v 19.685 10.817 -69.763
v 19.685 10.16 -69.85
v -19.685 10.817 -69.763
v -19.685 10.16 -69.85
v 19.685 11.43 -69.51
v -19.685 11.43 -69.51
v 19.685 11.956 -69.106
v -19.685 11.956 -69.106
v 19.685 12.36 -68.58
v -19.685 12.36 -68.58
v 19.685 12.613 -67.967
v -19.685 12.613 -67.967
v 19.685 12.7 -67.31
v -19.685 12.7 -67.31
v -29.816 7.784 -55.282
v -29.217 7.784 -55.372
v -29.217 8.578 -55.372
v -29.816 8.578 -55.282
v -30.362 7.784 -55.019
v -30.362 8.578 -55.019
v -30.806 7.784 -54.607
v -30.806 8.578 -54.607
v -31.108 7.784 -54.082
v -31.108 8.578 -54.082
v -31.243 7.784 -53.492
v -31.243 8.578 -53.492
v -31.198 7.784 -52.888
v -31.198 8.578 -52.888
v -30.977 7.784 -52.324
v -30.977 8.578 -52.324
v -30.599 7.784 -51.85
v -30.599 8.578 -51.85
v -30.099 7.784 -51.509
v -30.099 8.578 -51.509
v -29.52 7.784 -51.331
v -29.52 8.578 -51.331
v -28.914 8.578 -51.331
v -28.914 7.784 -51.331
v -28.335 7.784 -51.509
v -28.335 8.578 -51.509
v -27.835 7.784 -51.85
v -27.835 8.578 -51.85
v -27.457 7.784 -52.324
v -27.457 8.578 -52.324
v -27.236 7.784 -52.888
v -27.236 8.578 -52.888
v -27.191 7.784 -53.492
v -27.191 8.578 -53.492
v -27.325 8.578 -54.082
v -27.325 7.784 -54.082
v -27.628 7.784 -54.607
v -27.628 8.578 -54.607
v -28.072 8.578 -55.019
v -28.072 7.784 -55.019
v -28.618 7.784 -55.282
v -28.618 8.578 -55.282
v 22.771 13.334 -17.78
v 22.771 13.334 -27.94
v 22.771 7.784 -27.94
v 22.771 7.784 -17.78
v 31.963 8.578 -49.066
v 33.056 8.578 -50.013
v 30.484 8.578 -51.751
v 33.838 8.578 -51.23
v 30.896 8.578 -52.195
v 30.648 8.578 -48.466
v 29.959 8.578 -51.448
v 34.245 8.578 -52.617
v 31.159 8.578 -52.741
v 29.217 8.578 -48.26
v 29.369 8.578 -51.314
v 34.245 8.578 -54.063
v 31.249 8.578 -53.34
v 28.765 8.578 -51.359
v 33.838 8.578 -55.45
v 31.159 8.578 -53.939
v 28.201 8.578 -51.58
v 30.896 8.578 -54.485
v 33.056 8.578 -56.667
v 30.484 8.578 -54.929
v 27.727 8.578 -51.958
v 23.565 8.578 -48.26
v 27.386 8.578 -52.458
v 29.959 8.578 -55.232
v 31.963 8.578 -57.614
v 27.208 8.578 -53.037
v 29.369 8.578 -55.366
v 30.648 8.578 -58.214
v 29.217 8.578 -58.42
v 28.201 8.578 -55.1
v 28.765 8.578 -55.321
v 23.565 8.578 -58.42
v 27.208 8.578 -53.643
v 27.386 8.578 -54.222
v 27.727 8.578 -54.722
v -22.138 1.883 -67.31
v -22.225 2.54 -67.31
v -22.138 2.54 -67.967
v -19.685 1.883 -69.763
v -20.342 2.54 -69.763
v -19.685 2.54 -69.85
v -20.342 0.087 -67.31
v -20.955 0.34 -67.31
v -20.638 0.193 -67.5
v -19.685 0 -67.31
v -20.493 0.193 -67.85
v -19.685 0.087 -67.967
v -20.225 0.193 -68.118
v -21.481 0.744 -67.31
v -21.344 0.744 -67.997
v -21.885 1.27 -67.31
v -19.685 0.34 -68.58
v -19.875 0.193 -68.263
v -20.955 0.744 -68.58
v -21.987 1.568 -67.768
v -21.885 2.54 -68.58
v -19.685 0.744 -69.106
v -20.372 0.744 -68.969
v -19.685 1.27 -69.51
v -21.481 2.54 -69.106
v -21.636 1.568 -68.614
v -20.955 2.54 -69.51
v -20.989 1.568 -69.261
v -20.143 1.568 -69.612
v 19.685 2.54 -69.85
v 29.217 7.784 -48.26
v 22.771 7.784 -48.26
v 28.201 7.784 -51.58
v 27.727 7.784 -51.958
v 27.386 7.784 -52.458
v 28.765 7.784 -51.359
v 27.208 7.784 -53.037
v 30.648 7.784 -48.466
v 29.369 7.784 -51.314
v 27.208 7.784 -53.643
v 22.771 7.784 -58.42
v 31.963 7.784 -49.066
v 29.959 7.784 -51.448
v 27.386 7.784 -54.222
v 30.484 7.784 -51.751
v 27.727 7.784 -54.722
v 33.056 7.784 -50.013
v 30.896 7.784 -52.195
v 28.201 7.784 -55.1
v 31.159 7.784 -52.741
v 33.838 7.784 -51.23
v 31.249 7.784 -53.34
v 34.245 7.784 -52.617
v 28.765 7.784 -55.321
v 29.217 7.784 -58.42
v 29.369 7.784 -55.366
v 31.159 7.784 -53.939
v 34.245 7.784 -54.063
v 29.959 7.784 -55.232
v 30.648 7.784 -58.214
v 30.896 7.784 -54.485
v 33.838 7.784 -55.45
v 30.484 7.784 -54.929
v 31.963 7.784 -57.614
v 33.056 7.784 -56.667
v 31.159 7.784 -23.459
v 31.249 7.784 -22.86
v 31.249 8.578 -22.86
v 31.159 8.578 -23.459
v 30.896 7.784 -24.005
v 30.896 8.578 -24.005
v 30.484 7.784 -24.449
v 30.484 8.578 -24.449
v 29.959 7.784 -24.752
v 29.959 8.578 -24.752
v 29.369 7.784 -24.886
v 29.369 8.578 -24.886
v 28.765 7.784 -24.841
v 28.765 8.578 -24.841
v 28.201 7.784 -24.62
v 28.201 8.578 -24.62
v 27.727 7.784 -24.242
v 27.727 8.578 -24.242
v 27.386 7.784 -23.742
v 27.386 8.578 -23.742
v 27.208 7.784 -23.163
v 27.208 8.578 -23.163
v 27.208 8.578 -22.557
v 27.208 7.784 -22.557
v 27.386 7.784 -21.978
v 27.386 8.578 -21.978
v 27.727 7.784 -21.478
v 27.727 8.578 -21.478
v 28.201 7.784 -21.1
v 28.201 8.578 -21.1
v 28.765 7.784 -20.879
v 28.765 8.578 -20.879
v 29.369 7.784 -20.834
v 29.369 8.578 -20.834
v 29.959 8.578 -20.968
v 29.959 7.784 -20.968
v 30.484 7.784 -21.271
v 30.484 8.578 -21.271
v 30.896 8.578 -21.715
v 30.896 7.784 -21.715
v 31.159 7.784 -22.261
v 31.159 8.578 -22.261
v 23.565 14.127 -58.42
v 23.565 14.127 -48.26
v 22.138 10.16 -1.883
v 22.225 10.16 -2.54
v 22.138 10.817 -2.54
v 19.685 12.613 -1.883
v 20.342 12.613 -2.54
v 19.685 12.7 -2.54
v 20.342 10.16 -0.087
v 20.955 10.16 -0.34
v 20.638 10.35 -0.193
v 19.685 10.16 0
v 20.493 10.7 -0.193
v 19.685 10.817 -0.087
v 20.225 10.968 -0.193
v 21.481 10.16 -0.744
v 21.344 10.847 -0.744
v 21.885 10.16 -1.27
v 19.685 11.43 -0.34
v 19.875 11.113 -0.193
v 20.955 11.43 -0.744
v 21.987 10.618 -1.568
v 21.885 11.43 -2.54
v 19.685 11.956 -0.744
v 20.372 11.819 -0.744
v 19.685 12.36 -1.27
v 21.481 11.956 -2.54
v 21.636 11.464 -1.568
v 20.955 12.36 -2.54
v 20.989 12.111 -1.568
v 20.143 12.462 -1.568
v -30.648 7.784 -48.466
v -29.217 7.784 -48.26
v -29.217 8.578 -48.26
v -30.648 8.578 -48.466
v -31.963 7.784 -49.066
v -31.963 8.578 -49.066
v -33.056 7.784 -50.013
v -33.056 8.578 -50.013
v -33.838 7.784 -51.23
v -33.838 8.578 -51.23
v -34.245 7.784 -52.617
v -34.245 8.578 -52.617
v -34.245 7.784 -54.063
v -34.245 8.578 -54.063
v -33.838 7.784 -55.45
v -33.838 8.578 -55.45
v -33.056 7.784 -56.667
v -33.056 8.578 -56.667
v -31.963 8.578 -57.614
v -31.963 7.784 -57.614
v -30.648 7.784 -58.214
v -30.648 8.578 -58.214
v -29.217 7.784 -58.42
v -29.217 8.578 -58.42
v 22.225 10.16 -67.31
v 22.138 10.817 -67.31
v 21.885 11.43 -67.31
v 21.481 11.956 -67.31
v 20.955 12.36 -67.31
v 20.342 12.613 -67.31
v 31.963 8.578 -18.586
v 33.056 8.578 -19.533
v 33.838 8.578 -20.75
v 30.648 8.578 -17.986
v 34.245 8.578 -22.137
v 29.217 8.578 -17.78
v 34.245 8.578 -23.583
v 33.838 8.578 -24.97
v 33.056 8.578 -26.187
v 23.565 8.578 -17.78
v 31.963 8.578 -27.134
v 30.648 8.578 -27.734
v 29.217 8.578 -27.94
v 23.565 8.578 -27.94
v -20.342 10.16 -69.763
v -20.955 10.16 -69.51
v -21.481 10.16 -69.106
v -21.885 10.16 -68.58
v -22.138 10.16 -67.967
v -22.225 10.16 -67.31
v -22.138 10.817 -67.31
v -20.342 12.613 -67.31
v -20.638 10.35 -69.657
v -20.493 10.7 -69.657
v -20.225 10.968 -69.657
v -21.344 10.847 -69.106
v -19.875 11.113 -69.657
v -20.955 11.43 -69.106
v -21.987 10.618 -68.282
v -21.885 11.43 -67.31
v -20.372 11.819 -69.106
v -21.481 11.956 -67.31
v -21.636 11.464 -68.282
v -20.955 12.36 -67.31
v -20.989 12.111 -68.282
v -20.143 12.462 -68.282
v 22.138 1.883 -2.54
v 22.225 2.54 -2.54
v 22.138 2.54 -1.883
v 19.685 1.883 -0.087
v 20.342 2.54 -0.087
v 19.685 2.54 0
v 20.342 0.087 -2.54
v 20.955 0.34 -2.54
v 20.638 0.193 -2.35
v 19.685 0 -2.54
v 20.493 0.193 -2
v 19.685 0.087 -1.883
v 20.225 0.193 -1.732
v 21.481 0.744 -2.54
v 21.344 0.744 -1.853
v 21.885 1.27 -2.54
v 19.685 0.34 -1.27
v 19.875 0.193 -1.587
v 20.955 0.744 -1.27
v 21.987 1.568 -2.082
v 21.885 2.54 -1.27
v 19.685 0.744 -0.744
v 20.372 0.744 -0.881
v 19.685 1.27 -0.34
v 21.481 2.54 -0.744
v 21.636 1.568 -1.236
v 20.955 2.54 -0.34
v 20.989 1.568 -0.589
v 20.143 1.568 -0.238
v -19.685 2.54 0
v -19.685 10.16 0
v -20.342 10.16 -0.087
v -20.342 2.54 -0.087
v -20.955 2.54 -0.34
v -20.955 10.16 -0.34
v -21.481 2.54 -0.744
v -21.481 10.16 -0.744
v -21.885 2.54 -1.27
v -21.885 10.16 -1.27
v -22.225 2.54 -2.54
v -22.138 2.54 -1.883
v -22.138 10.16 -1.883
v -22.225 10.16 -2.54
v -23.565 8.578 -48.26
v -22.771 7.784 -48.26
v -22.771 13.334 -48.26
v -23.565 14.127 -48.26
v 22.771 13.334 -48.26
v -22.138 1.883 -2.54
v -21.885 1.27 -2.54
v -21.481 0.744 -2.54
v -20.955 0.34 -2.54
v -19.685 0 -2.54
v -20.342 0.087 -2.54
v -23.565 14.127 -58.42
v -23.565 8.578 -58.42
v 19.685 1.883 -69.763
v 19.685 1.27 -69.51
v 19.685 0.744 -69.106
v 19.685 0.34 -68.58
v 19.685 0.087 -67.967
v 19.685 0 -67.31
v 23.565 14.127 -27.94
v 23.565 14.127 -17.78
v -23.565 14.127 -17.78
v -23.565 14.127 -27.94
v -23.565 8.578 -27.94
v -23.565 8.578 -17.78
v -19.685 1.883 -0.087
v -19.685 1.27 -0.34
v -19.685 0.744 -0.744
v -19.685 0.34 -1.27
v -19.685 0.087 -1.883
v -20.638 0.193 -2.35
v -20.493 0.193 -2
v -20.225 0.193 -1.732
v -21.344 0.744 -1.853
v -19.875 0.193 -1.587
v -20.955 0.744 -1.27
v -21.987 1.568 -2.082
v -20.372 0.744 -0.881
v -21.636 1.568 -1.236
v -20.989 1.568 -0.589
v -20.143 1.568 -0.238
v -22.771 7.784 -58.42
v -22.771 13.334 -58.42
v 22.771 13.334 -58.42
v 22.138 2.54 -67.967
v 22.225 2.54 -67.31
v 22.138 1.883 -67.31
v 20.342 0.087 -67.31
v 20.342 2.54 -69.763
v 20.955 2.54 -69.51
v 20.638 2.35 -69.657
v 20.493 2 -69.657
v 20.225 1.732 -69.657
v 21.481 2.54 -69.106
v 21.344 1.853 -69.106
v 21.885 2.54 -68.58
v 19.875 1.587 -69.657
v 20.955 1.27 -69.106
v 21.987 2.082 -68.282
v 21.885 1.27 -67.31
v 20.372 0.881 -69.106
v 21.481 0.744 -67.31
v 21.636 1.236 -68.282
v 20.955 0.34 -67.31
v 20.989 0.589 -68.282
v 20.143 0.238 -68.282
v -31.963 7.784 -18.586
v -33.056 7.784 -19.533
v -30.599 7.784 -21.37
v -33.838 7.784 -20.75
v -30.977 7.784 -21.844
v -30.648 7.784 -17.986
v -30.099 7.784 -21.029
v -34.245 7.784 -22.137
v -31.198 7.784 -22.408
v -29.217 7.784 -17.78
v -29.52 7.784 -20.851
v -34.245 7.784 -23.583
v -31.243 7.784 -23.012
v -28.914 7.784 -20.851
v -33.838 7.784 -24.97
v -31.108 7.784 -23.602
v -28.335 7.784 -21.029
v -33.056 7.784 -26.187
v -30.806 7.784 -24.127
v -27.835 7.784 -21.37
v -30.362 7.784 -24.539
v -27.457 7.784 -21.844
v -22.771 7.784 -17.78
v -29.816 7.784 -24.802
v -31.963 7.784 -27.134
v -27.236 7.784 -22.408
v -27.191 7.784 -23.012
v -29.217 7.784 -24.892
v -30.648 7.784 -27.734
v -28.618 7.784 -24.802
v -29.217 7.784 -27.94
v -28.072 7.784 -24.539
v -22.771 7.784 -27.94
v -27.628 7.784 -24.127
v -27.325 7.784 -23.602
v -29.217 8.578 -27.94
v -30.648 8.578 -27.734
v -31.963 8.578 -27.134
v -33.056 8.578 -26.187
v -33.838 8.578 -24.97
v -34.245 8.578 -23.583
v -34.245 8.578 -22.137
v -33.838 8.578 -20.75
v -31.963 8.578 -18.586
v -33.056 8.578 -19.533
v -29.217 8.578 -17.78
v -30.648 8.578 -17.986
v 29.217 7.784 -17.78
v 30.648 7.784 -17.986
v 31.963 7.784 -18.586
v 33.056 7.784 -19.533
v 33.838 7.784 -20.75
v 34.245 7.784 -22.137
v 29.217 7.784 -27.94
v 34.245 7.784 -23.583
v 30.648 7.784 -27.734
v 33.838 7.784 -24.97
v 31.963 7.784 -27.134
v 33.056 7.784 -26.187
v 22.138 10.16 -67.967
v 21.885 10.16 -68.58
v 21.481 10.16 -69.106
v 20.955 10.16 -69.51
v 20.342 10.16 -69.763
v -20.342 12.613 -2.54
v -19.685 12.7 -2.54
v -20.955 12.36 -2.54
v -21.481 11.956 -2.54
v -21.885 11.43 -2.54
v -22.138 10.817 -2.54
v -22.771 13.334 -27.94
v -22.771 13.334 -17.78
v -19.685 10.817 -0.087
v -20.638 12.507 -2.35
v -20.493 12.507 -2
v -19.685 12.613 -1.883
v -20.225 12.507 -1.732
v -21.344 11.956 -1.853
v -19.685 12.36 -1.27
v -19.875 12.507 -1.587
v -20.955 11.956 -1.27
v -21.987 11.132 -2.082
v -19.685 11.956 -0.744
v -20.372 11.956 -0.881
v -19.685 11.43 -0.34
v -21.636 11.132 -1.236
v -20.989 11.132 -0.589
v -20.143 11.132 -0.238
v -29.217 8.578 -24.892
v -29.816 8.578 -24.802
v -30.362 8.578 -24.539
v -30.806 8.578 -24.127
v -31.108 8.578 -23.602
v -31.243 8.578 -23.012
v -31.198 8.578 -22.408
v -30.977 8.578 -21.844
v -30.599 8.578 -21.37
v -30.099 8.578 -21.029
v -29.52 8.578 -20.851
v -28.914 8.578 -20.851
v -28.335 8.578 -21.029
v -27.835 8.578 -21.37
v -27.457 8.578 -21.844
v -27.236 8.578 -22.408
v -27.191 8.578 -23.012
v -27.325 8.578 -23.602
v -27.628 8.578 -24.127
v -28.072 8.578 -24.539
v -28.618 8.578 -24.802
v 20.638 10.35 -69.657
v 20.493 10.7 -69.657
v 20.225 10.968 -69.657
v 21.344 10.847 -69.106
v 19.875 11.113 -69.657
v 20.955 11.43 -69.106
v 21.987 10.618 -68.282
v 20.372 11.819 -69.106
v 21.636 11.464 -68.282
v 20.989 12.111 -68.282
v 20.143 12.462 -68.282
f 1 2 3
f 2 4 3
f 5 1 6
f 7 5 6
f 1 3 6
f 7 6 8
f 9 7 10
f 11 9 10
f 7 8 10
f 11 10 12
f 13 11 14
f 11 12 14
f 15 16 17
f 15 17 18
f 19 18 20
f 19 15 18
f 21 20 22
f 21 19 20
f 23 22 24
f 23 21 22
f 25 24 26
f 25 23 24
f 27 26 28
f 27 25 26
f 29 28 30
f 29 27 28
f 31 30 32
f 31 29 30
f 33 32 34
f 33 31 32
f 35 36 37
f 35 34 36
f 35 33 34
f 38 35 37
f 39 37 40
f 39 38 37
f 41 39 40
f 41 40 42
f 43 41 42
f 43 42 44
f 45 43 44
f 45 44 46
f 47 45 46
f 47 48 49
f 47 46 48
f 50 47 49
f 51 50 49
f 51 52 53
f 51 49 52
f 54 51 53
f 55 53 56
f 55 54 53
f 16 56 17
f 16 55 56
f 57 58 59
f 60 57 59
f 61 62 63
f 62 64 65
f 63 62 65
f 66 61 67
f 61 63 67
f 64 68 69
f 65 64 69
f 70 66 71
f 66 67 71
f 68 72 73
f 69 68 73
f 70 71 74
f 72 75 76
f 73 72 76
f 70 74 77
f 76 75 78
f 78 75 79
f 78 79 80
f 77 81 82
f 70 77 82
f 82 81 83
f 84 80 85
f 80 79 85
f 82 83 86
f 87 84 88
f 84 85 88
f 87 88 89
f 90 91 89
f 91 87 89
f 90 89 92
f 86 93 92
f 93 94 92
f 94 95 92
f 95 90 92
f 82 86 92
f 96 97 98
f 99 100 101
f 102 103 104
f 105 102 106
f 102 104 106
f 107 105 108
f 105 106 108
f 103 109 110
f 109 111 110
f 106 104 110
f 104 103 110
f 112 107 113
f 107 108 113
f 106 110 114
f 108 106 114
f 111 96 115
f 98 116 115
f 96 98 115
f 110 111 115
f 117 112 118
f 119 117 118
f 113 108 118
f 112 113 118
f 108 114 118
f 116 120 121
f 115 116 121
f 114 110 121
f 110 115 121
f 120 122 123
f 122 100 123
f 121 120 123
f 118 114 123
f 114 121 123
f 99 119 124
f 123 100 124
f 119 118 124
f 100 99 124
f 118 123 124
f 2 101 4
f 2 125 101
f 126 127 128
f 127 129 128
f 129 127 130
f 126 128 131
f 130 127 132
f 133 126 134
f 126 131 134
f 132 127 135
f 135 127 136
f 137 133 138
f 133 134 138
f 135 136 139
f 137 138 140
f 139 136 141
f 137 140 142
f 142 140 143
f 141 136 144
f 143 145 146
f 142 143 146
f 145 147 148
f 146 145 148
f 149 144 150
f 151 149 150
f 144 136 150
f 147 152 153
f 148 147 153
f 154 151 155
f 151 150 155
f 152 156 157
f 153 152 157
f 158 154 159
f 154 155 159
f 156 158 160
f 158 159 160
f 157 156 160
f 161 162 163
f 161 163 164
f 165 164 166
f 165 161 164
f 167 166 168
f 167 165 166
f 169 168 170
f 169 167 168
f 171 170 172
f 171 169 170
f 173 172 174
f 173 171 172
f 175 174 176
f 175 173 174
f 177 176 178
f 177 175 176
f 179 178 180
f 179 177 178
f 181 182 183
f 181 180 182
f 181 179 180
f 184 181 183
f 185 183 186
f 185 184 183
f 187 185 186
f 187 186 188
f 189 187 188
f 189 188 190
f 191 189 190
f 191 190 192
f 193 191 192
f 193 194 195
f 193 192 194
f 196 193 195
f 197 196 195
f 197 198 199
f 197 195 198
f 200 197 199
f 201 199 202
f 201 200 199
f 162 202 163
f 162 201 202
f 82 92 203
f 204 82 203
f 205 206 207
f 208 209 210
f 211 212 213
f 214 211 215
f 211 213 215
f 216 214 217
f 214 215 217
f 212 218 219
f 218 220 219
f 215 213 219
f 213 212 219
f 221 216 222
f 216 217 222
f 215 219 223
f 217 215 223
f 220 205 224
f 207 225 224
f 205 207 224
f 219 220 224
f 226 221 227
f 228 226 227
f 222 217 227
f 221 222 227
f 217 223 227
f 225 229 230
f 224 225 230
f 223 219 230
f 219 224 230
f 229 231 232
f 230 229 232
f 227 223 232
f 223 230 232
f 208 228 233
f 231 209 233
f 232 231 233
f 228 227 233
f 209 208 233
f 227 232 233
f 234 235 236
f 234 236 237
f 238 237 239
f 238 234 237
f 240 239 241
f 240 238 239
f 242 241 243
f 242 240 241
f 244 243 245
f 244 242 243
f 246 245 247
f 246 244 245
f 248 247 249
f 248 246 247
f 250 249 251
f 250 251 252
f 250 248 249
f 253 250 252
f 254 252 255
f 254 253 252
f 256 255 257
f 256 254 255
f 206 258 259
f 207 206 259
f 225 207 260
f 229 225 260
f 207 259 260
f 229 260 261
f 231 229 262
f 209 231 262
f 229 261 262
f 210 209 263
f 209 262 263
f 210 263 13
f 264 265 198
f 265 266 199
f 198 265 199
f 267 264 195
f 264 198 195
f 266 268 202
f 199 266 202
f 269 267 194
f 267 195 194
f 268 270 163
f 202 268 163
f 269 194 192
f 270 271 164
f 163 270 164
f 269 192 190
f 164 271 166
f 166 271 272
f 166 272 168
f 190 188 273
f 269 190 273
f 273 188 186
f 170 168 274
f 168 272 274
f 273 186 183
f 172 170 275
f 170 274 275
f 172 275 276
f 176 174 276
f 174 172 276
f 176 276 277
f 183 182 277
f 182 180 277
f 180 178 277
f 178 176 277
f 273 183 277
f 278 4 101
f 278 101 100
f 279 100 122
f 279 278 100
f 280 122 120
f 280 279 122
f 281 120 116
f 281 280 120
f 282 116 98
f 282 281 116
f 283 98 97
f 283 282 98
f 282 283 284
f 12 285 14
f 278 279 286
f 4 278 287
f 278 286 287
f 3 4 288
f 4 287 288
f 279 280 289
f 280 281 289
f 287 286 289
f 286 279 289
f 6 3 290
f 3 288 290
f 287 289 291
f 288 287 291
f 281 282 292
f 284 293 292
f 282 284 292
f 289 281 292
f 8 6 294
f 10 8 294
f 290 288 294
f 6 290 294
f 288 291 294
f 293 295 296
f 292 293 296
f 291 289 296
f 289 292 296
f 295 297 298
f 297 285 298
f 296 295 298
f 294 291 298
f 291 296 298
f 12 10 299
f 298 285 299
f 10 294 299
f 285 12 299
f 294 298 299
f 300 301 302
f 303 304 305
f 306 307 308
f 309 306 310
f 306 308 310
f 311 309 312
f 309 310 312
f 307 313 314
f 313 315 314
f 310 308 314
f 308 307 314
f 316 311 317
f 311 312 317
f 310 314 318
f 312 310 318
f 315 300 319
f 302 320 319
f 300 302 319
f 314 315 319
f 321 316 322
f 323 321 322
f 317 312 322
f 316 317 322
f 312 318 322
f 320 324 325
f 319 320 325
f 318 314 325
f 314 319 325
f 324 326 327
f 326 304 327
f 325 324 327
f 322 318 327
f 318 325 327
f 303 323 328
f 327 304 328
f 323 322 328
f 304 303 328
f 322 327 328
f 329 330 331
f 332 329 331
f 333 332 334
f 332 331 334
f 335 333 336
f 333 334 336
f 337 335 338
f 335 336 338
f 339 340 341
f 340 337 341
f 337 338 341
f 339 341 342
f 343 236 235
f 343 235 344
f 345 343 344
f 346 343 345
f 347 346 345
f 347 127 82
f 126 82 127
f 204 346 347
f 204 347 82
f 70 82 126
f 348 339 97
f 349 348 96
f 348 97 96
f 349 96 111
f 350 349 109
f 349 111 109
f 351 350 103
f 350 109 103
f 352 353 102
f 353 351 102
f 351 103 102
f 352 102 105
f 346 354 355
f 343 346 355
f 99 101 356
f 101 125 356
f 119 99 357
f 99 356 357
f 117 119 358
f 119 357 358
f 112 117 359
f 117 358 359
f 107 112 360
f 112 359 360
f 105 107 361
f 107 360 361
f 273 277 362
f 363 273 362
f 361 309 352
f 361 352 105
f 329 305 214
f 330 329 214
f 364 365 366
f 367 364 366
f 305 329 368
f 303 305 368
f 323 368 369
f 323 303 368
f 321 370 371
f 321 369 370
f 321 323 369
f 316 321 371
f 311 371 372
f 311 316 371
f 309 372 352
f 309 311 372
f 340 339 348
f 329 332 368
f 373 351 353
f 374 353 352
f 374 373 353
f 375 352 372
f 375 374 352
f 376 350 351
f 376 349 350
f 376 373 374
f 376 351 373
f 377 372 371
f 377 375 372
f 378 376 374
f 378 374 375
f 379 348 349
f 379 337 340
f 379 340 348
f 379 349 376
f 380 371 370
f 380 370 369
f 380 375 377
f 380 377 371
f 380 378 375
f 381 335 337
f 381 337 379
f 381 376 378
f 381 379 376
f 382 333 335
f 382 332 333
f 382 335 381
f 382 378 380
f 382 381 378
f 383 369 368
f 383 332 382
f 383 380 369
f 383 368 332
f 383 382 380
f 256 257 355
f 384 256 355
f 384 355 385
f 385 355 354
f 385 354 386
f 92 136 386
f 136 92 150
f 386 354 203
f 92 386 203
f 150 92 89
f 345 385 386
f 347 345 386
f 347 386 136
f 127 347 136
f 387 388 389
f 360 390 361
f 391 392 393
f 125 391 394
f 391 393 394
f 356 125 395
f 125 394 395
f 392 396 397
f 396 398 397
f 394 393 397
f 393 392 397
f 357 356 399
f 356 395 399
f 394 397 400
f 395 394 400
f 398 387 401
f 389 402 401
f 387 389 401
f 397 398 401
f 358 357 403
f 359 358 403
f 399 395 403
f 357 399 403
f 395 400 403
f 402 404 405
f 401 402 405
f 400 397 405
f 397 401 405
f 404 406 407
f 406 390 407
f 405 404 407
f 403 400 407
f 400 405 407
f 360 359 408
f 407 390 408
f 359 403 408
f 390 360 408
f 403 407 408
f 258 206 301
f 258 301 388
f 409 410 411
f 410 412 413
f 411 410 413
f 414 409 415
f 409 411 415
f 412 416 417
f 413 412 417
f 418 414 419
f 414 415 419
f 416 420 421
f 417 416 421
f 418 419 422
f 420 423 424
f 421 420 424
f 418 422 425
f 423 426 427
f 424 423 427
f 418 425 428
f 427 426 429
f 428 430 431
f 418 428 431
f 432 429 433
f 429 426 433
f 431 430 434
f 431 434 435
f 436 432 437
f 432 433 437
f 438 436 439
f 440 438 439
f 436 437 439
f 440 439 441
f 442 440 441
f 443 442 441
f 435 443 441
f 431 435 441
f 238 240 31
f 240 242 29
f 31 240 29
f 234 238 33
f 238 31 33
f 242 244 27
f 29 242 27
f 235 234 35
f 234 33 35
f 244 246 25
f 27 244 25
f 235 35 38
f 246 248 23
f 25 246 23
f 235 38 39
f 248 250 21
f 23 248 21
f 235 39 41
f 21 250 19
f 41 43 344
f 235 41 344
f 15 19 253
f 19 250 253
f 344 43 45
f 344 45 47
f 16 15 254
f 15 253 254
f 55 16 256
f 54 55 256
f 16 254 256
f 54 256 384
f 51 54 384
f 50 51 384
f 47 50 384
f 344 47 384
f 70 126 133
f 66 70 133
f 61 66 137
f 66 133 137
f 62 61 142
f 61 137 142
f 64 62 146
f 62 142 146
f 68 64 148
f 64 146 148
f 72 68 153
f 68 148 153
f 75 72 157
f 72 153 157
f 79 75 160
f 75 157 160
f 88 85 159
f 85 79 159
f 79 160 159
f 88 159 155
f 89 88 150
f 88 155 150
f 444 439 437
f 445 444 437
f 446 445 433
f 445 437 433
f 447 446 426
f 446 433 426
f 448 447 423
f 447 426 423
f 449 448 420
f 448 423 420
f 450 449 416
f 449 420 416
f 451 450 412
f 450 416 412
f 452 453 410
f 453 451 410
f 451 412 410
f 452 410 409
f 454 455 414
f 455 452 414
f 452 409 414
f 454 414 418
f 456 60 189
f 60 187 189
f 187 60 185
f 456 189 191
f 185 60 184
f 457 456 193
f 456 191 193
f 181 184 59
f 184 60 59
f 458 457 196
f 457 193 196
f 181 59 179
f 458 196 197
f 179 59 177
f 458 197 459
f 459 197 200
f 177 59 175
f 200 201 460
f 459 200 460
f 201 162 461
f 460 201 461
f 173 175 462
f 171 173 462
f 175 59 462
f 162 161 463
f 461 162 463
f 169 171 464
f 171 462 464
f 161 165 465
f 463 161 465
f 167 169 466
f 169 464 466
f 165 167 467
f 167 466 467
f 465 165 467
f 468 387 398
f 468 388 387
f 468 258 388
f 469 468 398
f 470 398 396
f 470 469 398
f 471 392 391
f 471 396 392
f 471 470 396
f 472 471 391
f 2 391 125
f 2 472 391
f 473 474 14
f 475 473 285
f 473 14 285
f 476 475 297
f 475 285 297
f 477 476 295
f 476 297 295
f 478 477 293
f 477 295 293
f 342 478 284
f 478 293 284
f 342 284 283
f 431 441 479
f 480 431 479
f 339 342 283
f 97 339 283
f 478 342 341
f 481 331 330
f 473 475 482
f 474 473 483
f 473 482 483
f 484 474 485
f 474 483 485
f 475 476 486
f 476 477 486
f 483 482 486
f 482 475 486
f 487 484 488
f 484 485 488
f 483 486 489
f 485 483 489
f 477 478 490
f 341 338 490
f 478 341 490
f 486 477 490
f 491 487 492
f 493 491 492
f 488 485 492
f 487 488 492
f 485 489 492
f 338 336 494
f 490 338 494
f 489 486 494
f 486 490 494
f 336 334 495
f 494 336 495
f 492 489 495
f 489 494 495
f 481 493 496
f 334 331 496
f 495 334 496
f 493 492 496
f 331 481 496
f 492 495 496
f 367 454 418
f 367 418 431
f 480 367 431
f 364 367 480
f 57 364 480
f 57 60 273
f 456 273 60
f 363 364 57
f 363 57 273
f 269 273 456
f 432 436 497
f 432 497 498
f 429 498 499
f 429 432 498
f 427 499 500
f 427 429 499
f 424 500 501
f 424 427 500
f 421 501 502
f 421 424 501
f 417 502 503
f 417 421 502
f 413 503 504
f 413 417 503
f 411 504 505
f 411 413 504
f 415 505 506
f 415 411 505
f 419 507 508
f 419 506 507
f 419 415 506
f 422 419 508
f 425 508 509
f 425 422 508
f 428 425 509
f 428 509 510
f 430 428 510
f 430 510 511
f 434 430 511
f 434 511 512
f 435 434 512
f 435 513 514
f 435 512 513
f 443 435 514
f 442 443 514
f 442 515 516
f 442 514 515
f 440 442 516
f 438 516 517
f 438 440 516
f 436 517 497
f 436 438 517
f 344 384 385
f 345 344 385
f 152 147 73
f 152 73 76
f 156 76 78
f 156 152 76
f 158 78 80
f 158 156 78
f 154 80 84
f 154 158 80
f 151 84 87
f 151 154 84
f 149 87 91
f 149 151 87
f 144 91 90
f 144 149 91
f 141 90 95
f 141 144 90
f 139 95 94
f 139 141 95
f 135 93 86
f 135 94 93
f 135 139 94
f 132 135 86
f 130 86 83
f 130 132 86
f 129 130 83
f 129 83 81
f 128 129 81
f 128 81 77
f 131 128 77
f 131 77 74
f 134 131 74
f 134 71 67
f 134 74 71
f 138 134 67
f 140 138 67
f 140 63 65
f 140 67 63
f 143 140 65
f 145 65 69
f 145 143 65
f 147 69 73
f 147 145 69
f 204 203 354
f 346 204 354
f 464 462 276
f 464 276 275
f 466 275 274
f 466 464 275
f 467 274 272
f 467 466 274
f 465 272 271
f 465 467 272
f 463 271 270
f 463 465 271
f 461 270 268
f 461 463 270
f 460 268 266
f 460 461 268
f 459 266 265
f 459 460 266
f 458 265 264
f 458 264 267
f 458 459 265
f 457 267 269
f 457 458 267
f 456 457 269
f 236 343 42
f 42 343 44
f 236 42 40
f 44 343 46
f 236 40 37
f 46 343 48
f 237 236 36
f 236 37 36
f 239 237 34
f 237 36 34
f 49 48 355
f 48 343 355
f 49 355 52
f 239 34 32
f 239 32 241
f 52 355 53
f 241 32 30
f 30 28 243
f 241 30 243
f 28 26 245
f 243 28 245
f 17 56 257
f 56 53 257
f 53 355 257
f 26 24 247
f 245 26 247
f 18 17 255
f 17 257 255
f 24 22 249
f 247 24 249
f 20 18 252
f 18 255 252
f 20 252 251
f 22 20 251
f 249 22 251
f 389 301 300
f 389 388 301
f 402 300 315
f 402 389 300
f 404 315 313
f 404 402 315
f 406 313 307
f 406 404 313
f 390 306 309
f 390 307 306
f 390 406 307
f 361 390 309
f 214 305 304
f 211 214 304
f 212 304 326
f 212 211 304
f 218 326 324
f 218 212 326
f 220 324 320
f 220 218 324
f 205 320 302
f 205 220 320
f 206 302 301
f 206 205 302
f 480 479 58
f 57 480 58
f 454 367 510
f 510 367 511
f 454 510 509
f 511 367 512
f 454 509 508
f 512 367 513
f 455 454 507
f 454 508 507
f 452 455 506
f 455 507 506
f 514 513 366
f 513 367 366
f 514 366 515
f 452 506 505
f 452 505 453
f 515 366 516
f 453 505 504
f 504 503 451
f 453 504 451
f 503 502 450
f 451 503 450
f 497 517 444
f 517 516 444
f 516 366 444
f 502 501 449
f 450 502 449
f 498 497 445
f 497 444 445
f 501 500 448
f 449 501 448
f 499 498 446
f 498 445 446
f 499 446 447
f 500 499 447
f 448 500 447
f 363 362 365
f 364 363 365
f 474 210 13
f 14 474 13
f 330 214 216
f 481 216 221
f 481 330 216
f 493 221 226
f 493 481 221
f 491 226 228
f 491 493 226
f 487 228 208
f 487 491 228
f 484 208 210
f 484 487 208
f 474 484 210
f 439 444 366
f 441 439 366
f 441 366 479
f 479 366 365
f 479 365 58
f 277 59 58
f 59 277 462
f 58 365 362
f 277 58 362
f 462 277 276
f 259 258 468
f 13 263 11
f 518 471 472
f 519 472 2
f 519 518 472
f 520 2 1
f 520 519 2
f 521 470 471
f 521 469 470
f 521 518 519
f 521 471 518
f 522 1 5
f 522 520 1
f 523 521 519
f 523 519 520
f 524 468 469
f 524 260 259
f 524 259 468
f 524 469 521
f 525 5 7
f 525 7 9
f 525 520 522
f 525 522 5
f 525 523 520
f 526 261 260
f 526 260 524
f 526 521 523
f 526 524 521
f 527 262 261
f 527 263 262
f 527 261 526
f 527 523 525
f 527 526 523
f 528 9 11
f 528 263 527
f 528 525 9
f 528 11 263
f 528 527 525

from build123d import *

# Parameters (mm, degrees)
SKETCH1_W      = 69.85
SKETCH1_H      = 12.7
EXTRUDE1_DEPTH = 22.225
FILLET1_R      = 2.54
EXTRUDE2_START = -27.94
EXTRUDE2_DEPTH = 10.16
EXTRUDE3_START = -58.42
EXTRUDE3_DEPTH = 10.16
SKETCH3_R      = 2.032
EXTRUDE4_DEPTH = 18.542


with BuildPart() as part:
    # Sketch1 → Extrude1 (new, symmetric)
    with BuildSketch(Plane(origin=(0, 0, 0), x_dir=(0, 0, -1), z_dir=(1, 0, 0))):
        with Locations((34.925, 6.35)):
            Rectangle(SKETCH1_W, SKETCH1_H)
    extrude(amount=EXTRUDE1_DEPTH, both=True)

    # Fillet1
    fillet1_edges = [part.edges().sort_by_distance(p)[0] for p in [
        (22.225, 12.7, -34.925),
        (22.225, 6.35, 0),
        (22.225, 0, -34.925),
        (-22.225, 6.35, 0),
        (-22.225, 12.7, -34.925),
        (-22.225, 6.35, -69.85),
        (-22.225, 0, -34.925),
        (22.225, 6.35, -69.85),
        (0, 0, 0),
        (0, 12.7, 0),
        (0, 12.7, -69.85),
        (0, 0, -69.85),
    ]]
    fillet(fillet1_edges, radius=FILLET1_R)


with BuildPart() as body_2:
    # Sketch2 → Extrude2 (new body)
    with BuildSketch(Plane.XY.offset(EXTRUDE2_START)):
        Polygon((-34.868909027, 7.784119326), (-22.771071042, 7.784119326), (-22.771071042, 13.333656019), (0, 13.333656019), (22.771071042, 13.333656019), (22.771071042, 7.784119326), (34.868909027, 7.784119326), (34.868909027, 8.577869326), (23.564821042, 8.577869326), (23.564821042, 14.127406019), (0, 14.127406019), (-23.564821042, 14.127406019), (-23.564821042, 8.577869326), (-34.868909027, 8.577869326), align=None)
    extrude(amount=EXTRUDE2_DEPTH)


with BuildPart() as body_3:
    # Sketch2<2> → Extrude3 (new body)
    with BuildSketch(Plane.XY.offset(EXTRUDE3_START)):
        Polygon((-34.868909027, 7.784119326), (-22.771071042, 7.784119326), (-22.771071042, 13.333656019), (0, 13.333656019), (22.771071042, 13.333656019), (22.771071042, 7.784119326), (34.868909027, 7.784119326), (34.868909027, 8.577869326), (23.564821042, 8.577869326), (23.564821042, 14.127406019), (0, 14.127406019), (-23.564821042, 14.127406019), (-23.564821042, 8.577869326), (-34.868909027, 8.577869326), align=None)
    extrude(amount=EXTRUDE3_DEPTH)


with BuildPart() as extrude4_tool:
    # Sketch3 → Extrude4 (new body)
    with BuildSketch(Plane(origin=(0, 0, 0), x_dir=(1, 0, 0), z_dir=(0, 1, 0))):
        with Locations((29.216865034, 53.34)):
            Circle(SKETCH3_R)
        with Locations((29.216865034, 22.86)):
            Circle(SKETCH3_R)
        with Locations(Location((-29.216865034, 22.86, 0), (0, 0, 90))):
            Circle(SKETCH3_R)
        with Locations(Location((-29.216865034, 53.34, 0), (0, 0, 90))):
            Circle(SKETCH3_R)
        with BuildLine():
            Line((-29.216865034, 58.42), (-40.15144848, 58.42))
            Line((-40.15144848, 58.42), (-40.15144848, 48.26))
            Line((-40.15144848, 48.26), (-29.216865034, 48.26))
            ThreePointArc((-29.216865034, 48.26), (-34.296865034, 53.34), (-29.216865034, 58.42))
        make_face()
        with BuildLine():
            Line((-29.216865034, 17.78), (-40.15144848, 17.78))
            Line((-40.15144848, 17.78), (-40.15144848, 27.94))
            Line((-40.15144848, 27.94), (-29.216865034, 27.94))
            ThreePointArc((-29.216865034, 27.94), (-34.296865034, 22.86), (-29.216865034, 17.78))
        make_face()
        with BuildLine():
            Line((40.15144848, 48.26), (29.216865034, 48.26))
            ThreePointArc((29.216865034, 48.26), (34.296865034, 53.34), (29.216865034, 58.42))
            Line((29.216865034, 58.42), (40.15144848, 58.42))
            Line((40.15144848, 58.42), (40.15144848, 48.26))
        make_face()
        with BuildLine():
            Line((40.15144848, 17.78), (40.15144848, 27.94))
            Line((40.15144848, 27.94), (29.216865034, 27.94))
            ThreePointArc((29.216865034, 27.94), (34.296865034, 22.86), (29.216865034, 17.78))
            Line((29.216865034, 17.78), (40.15144848, 17.78))
        make_face()
    extrude(amount=EXTRUDE4_DEPTH)


with BuildPart() as body_2_1:
    add(body_2.part)

    # Extrude4: cut by extrude4_tool
    add(extrude4_tool.part, mode=Mode.SUBTRACT)


with BuildPart() as body_3_1:
    add(body_3.part)

    # Extrude4: cut by extrude4_tool
    add(extrude4_tool.part, mode=Mode.SUBTRACT)


solid = Compound([part.part, body_2_1.part, body_3_1.part])
